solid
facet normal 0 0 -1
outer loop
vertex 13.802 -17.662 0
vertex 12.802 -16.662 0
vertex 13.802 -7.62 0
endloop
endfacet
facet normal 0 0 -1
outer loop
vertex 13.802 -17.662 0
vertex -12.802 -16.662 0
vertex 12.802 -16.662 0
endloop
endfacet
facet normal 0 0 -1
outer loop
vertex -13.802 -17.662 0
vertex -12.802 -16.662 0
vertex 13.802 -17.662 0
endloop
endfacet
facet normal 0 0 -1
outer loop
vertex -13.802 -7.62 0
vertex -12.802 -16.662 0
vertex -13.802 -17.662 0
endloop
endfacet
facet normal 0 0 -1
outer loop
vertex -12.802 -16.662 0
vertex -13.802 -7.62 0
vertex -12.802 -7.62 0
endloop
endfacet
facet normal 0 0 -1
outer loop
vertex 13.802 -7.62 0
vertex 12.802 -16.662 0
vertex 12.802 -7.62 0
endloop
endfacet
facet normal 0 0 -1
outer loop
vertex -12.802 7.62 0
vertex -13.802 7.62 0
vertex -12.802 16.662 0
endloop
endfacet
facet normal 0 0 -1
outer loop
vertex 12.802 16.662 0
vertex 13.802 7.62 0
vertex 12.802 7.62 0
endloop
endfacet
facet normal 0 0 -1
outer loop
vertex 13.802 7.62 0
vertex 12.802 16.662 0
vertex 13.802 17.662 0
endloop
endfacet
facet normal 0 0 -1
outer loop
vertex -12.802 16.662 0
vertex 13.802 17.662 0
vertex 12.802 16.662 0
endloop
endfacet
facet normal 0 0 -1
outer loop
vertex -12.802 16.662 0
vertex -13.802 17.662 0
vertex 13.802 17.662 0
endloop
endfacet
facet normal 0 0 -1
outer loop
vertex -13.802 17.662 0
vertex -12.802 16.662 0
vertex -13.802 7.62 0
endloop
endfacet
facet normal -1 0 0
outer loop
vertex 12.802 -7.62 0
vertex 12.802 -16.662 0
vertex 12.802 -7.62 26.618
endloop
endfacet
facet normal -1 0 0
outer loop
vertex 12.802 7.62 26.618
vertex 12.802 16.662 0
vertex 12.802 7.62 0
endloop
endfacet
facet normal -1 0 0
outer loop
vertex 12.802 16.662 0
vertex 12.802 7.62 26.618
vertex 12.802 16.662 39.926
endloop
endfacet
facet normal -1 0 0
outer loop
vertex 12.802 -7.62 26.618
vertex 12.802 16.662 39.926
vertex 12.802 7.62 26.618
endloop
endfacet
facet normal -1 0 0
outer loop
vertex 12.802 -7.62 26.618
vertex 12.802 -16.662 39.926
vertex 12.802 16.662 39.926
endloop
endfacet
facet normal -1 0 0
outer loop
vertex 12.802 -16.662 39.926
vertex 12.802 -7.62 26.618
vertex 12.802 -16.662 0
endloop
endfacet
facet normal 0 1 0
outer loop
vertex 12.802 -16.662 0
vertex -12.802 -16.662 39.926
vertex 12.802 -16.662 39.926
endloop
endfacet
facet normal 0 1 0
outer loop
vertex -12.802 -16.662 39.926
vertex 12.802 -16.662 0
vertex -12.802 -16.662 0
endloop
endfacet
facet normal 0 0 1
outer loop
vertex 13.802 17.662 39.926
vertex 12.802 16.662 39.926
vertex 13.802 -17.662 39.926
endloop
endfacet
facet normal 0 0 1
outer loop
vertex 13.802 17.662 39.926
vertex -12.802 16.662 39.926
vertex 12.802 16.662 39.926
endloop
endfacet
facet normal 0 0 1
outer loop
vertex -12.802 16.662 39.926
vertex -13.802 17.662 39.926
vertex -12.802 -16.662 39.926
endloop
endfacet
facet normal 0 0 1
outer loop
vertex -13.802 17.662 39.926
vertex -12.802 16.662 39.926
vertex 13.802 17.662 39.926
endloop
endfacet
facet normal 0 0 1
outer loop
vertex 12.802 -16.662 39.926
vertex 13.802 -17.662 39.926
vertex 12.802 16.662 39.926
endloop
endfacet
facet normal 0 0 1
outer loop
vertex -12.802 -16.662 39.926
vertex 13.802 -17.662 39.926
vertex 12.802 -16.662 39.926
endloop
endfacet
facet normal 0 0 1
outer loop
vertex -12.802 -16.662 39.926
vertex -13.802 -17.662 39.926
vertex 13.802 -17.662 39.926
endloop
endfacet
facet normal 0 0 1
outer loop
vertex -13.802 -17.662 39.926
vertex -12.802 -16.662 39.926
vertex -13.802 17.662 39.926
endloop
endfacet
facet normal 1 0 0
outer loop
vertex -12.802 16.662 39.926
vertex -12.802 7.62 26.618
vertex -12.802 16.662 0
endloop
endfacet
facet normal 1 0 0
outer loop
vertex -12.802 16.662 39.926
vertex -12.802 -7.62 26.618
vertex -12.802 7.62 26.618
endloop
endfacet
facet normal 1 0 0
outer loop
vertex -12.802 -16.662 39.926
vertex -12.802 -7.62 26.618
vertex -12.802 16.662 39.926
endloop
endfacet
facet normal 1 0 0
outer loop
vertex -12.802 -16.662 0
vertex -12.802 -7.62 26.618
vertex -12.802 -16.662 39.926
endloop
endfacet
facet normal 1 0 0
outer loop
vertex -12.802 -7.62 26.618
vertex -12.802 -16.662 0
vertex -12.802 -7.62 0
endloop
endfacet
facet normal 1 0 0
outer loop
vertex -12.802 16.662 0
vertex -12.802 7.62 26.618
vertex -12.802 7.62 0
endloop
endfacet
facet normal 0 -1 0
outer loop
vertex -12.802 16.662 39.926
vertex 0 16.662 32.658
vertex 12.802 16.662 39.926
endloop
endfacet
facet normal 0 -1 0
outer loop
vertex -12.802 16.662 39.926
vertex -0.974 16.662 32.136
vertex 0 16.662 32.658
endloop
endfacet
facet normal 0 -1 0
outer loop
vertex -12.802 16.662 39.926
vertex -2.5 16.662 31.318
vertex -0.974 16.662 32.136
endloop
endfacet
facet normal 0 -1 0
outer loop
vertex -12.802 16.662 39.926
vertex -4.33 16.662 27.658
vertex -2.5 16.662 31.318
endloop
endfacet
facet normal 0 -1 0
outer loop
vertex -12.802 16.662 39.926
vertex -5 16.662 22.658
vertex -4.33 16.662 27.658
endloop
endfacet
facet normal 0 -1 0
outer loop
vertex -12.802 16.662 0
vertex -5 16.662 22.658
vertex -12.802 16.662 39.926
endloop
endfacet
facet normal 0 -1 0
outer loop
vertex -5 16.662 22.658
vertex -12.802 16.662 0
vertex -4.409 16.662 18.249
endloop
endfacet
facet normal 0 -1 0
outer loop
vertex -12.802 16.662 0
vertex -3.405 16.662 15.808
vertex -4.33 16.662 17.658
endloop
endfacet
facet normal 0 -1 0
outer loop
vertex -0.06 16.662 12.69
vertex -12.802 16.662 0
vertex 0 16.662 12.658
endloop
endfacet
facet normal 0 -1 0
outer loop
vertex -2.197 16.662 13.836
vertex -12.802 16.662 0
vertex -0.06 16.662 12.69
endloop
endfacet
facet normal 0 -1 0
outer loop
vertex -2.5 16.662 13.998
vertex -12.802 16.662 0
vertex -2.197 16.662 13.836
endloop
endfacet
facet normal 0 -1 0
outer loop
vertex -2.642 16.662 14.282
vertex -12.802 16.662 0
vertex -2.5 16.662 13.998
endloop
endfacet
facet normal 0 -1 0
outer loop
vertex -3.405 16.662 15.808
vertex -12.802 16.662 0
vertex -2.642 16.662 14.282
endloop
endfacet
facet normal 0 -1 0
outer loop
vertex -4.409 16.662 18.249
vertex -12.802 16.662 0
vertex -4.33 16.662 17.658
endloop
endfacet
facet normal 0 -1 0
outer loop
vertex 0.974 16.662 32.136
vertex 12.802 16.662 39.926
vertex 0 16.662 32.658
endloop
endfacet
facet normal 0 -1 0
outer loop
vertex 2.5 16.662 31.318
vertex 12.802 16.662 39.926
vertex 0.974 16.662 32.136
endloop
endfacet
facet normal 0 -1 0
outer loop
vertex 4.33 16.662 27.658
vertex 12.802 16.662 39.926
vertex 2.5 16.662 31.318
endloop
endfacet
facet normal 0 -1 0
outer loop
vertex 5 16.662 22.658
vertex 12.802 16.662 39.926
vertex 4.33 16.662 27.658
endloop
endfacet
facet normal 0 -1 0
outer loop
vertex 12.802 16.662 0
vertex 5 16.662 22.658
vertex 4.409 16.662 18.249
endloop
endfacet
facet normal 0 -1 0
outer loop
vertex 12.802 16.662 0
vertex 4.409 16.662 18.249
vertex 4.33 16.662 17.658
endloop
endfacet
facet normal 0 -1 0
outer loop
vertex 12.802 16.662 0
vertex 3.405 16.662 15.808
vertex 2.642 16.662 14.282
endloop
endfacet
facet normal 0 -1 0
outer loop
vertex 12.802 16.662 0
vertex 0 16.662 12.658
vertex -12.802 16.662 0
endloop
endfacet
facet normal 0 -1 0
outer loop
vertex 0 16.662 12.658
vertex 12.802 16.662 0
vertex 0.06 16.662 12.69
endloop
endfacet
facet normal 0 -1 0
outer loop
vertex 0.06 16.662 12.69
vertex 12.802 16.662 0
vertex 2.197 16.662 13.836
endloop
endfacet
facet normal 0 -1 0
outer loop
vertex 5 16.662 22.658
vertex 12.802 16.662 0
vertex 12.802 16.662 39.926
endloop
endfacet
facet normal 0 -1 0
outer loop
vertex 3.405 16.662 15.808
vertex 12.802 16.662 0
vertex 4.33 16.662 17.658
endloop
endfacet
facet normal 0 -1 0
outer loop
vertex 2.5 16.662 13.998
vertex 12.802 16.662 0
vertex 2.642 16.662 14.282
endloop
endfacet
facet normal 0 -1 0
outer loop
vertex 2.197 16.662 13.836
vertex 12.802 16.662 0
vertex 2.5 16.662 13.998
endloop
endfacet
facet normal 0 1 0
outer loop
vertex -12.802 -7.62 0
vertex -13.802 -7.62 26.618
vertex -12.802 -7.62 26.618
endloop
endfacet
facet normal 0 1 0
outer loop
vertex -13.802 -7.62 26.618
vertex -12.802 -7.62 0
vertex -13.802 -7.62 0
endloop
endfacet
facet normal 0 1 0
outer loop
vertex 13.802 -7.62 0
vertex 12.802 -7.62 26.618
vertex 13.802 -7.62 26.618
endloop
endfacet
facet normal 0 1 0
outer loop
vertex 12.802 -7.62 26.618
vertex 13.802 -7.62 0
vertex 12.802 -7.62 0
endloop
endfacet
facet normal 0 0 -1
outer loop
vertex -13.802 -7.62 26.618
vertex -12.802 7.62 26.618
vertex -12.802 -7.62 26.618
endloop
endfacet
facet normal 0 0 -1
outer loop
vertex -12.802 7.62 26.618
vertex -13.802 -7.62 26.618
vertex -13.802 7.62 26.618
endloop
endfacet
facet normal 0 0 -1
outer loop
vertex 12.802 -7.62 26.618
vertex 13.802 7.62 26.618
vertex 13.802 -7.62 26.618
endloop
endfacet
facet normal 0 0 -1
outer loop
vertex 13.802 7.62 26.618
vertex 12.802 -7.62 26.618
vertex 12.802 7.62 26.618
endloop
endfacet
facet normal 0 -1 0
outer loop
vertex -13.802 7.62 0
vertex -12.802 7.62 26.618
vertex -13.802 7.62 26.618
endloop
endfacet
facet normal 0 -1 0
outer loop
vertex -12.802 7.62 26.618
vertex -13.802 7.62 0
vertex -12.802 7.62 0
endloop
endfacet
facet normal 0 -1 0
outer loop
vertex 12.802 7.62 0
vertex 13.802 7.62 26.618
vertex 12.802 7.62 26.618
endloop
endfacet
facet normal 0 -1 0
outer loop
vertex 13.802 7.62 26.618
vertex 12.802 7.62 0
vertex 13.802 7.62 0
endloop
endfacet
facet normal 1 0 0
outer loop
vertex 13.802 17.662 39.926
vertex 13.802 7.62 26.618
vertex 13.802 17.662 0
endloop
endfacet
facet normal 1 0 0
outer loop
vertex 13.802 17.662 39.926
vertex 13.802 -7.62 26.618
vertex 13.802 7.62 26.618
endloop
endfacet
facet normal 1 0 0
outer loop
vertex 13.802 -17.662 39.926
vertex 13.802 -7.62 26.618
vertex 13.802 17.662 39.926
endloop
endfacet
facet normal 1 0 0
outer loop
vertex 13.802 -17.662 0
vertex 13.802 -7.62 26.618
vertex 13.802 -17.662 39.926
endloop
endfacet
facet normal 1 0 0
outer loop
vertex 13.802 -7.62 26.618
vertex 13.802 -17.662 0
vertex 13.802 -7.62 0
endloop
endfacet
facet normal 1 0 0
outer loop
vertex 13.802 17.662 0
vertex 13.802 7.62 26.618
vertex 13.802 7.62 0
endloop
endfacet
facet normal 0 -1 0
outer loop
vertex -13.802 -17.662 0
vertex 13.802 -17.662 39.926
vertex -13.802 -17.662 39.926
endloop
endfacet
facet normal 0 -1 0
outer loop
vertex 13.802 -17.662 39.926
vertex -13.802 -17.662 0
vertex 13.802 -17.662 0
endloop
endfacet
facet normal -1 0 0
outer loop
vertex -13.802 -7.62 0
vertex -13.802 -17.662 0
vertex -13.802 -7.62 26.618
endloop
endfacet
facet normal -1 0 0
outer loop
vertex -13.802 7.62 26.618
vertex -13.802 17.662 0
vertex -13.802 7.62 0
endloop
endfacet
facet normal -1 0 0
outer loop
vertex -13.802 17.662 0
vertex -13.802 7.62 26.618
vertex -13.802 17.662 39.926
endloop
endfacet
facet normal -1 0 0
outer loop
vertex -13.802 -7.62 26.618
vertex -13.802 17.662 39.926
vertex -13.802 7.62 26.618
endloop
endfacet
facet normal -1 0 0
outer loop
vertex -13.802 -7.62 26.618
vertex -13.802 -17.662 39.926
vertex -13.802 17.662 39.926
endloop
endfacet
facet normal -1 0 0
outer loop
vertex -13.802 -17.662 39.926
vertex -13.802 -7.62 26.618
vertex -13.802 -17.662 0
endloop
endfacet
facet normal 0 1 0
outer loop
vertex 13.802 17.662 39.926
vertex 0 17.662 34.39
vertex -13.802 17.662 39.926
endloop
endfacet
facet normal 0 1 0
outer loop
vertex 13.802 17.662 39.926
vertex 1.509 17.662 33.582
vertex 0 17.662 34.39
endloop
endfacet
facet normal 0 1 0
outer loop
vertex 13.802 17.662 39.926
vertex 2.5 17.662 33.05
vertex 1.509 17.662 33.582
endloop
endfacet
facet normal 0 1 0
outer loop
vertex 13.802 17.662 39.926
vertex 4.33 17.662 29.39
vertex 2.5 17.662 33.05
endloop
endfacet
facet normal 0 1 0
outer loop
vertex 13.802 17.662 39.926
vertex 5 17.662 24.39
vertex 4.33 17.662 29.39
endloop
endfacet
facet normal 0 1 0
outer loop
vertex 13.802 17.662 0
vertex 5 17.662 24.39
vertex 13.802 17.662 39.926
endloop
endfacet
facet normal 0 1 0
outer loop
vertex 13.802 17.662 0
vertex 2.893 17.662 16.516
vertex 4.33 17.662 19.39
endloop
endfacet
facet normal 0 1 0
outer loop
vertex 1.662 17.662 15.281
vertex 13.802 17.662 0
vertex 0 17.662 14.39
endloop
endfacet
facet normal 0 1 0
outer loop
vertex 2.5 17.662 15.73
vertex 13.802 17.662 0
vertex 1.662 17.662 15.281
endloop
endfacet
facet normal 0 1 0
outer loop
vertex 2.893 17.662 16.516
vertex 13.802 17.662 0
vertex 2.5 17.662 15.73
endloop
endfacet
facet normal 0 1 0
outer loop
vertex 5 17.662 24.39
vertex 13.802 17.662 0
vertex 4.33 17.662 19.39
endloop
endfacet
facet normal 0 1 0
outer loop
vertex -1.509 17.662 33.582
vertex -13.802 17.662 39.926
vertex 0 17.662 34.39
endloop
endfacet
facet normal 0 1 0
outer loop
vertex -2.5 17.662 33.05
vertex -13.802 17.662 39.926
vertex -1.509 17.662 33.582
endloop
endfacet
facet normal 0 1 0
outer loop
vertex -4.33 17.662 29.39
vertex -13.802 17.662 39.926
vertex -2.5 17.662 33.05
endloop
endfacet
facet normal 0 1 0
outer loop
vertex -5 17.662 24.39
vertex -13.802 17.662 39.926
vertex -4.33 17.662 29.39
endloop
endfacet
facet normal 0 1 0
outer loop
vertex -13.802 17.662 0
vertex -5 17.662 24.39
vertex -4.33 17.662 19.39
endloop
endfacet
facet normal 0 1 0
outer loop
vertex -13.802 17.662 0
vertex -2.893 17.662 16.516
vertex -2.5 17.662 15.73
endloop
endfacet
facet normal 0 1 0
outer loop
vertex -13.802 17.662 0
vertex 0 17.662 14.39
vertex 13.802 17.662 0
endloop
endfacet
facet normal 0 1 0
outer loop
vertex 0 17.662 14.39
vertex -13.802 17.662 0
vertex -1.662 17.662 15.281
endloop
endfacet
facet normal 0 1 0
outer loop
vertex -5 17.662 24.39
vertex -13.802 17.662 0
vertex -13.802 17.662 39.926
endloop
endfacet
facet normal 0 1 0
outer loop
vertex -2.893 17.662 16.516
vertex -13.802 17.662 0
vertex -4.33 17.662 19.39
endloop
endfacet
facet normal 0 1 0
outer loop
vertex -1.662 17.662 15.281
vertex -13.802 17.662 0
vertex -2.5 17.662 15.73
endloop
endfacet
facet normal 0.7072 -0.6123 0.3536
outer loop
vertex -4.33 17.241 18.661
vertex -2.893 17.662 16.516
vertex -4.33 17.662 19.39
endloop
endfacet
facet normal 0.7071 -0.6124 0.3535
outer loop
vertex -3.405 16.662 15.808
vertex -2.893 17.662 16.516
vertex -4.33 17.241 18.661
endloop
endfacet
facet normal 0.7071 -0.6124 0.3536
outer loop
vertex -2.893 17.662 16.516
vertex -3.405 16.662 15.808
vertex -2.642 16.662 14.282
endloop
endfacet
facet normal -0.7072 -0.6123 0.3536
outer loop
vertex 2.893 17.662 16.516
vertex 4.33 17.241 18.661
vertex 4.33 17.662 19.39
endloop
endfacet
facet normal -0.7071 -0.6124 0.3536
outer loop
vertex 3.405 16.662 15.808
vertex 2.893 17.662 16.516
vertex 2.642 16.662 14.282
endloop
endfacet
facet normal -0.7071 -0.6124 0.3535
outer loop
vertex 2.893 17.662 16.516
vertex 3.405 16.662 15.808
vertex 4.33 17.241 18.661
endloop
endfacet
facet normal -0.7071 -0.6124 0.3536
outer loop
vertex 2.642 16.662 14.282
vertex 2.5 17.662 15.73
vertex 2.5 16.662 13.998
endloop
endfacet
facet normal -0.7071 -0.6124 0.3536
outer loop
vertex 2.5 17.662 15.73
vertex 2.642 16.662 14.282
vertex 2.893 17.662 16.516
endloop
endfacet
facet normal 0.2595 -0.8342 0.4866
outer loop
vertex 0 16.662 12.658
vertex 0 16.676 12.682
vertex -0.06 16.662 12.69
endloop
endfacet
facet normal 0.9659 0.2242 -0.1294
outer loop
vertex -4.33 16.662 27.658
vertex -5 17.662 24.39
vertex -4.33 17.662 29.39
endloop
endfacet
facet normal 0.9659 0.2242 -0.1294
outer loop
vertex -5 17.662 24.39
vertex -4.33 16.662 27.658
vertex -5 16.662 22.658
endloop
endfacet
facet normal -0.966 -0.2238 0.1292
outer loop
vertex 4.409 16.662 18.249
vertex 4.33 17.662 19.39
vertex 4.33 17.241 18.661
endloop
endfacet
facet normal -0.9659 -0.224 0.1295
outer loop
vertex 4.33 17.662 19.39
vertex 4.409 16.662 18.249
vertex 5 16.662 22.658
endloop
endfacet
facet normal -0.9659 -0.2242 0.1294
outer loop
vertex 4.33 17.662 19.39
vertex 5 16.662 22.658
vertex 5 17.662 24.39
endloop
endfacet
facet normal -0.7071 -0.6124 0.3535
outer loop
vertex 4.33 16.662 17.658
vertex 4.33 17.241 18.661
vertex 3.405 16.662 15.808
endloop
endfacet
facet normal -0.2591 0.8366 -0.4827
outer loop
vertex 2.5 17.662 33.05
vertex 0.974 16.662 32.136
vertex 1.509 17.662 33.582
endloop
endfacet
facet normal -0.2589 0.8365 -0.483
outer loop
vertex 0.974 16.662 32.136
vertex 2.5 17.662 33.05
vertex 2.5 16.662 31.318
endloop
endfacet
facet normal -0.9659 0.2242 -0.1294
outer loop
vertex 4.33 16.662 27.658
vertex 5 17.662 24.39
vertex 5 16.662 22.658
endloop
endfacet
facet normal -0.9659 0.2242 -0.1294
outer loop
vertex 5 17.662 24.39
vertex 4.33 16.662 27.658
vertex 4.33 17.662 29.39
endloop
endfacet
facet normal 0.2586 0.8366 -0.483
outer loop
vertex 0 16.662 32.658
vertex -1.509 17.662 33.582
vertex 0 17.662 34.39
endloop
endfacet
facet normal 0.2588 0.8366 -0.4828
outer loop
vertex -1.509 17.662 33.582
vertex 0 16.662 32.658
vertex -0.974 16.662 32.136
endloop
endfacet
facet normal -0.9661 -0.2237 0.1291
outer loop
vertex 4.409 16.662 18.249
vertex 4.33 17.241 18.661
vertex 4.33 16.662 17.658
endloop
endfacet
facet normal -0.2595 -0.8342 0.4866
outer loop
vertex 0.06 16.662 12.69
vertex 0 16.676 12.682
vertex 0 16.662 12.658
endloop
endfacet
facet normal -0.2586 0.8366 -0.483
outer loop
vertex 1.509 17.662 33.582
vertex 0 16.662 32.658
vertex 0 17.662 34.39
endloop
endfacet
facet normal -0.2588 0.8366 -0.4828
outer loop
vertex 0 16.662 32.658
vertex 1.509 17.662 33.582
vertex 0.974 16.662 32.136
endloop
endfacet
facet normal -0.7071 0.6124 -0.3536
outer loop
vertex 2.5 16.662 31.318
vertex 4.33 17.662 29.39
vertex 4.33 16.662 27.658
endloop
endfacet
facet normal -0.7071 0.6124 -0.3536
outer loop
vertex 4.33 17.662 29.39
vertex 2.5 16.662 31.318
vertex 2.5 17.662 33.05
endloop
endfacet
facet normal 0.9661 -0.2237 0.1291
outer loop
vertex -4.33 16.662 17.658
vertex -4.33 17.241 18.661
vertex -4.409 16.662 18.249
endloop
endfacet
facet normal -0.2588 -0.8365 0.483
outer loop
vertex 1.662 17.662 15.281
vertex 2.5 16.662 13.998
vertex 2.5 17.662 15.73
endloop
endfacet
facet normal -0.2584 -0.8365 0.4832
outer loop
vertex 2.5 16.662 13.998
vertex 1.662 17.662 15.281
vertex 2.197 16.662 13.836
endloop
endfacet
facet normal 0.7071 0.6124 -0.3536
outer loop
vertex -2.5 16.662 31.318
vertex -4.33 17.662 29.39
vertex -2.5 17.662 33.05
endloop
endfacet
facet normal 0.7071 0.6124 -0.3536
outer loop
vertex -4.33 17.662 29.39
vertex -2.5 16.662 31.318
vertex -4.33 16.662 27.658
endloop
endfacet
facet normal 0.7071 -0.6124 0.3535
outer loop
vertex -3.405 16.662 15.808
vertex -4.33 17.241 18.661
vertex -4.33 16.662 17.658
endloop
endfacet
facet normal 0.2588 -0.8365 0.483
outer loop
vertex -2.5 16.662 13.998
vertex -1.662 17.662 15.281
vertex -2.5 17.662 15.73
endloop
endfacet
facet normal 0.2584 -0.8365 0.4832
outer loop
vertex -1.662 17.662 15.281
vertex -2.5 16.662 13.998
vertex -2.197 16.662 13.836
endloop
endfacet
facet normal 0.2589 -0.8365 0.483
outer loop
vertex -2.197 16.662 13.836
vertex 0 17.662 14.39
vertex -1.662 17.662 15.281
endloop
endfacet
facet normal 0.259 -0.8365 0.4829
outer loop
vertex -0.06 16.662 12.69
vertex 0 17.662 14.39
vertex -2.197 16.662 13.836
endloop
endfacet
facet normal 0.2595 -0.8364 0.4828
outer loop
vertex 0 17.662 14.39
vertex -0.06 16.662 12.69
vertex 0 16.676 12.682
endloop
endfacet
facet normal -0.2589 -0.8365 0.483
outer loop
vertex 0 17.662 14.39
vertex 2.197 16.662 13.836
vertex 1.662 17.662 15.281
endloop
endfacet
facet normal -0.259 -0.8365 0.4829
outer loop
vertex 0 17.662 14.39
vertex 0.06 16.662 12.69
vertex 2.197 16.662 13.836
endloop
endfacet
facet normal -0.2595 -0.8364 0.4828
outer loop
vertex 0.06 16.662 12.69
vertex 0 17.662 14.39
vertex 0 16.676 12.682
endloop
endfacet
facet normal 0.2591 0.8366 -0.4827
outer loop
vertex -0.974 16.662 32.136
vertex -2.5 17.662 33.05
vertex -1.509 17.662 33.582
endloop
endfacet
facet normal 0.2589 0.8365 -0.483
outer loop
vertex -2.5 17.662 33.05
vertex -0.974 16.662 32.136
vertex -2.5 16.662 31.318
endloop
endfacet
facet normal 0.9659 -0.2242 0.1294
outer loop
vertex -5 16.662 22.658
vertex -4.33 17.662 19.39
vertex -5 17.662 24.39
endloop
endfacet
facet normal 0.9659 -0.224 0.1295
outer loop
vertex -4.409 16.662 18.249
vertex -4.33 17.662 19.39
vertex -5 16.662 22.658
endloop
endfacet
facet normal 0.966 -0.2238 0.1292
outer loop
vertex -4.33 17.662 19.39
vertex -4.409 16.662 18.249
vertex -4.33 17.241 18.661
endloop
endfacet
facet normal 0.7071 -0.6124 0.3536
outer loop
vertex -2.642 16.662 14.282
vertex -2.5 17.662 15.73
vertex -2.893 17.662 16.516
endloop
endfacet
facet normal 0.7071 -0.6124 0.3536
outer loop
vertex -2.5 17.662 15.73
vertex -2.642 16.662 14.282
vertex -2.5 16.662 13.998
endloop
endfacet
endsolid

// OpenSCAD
/// @file Optical flow opticFlowCamCaseV02
///
/// @brief Create a test casing for optic flow cemra module ADNS3080
///
///
/// Created 10 Jan 2017
/// Modified 23 Jan 2017 (V02)
/// -fixed thickness direction
/// -LED cavity at 30 deg
///
/// @author Mustafa Ghazi

caseHeight = 0.7845*25.4 + 20.0; // [mm]
caseWidth = 1.008*25.4; // [mm]
caseLength = 1.312*25.4; // [mm]
dT = 1.0; // [mm]
minDiaLED = 10.0; // [mm]
maxDiaLED = 10.8; //[mm]
heightLED = 13.65; // [mm]

difference() {

	difference () {

	// outer solid
		translate([ 0, 0, 0]) linear_extrude(height = caseHeight, center = false, convexity = 10, twist = 0, slices = 20, scale = 1.0) { polygon(points = [[-caseWidth/2.0-dT,-caseLength/2.0-dT],[-caseWidth/2.0-dT,caseLength/2.0+dT],[caseWidth/2.0+dT,caseLength/2.0+dT],[caseWidth/2.0+dT,-caseLength/2.0-dT]], paths = undef, convexity = 1);
		}

		// hollow out the outer solid
		union() {
			// inner
			translate([ 0, 0, 0]) linear_extrude(height = caseHeight, center = false, convexity = 10, twist = 0, slices = 20, scale = 1.0) { polygon(points = [[-caseWidth/2.0,-caseLength/2.0],[-caseWidth/2.0,caseLength/2.0],[caseWidth/2.0,caseLength/2.0],[caseWidth/2.0,-caseLength/2.0]], paths = undef, convexity = 1);
			}

			// remove width wall material for now
			translate([ 0, 0, 0]) linear_extrude(height = caseHeight*2/3, center = false, convexity = 10, twist = 0, slices = 20, scale = 1.0) { polygon(points = [[-55,-0.3*25.4],[-55,0.3*25.4],[55,0.3*25.4],[55,-0.3*25.4]], paths = undef, convexity = 1);
			}
			
			/*

			// remove length wall material for now
			translate([ 0, 0, 0]) linear_extrude(height = caseHeight*2/3, center = false, convexity = 10, twist = 0, slices = 20, scale = 1.0) { polygon(points = [[-0.25*25.4,-55],[-0.25*25.4,55],[0.25*25.4,55],[0.25*25.4,-55]], paths = undef, convexity = 1);
			}
			*/


		} // end union
		
	} // end difference
	
	// hollow out the 10mm LED cavity at 30 deg angle
	translate([0, 0.7*caseLength/2, 0.7*20]) {
		rotate([-30, 0,  0]) { 
			linear_extrude(height = heightLED*2, center = false, convexity = 10, twist = 0, slices = 20, scale = 1.0) { circle(d=minDiaLED,$fn=12); }
		}
	}


	
} // end union
